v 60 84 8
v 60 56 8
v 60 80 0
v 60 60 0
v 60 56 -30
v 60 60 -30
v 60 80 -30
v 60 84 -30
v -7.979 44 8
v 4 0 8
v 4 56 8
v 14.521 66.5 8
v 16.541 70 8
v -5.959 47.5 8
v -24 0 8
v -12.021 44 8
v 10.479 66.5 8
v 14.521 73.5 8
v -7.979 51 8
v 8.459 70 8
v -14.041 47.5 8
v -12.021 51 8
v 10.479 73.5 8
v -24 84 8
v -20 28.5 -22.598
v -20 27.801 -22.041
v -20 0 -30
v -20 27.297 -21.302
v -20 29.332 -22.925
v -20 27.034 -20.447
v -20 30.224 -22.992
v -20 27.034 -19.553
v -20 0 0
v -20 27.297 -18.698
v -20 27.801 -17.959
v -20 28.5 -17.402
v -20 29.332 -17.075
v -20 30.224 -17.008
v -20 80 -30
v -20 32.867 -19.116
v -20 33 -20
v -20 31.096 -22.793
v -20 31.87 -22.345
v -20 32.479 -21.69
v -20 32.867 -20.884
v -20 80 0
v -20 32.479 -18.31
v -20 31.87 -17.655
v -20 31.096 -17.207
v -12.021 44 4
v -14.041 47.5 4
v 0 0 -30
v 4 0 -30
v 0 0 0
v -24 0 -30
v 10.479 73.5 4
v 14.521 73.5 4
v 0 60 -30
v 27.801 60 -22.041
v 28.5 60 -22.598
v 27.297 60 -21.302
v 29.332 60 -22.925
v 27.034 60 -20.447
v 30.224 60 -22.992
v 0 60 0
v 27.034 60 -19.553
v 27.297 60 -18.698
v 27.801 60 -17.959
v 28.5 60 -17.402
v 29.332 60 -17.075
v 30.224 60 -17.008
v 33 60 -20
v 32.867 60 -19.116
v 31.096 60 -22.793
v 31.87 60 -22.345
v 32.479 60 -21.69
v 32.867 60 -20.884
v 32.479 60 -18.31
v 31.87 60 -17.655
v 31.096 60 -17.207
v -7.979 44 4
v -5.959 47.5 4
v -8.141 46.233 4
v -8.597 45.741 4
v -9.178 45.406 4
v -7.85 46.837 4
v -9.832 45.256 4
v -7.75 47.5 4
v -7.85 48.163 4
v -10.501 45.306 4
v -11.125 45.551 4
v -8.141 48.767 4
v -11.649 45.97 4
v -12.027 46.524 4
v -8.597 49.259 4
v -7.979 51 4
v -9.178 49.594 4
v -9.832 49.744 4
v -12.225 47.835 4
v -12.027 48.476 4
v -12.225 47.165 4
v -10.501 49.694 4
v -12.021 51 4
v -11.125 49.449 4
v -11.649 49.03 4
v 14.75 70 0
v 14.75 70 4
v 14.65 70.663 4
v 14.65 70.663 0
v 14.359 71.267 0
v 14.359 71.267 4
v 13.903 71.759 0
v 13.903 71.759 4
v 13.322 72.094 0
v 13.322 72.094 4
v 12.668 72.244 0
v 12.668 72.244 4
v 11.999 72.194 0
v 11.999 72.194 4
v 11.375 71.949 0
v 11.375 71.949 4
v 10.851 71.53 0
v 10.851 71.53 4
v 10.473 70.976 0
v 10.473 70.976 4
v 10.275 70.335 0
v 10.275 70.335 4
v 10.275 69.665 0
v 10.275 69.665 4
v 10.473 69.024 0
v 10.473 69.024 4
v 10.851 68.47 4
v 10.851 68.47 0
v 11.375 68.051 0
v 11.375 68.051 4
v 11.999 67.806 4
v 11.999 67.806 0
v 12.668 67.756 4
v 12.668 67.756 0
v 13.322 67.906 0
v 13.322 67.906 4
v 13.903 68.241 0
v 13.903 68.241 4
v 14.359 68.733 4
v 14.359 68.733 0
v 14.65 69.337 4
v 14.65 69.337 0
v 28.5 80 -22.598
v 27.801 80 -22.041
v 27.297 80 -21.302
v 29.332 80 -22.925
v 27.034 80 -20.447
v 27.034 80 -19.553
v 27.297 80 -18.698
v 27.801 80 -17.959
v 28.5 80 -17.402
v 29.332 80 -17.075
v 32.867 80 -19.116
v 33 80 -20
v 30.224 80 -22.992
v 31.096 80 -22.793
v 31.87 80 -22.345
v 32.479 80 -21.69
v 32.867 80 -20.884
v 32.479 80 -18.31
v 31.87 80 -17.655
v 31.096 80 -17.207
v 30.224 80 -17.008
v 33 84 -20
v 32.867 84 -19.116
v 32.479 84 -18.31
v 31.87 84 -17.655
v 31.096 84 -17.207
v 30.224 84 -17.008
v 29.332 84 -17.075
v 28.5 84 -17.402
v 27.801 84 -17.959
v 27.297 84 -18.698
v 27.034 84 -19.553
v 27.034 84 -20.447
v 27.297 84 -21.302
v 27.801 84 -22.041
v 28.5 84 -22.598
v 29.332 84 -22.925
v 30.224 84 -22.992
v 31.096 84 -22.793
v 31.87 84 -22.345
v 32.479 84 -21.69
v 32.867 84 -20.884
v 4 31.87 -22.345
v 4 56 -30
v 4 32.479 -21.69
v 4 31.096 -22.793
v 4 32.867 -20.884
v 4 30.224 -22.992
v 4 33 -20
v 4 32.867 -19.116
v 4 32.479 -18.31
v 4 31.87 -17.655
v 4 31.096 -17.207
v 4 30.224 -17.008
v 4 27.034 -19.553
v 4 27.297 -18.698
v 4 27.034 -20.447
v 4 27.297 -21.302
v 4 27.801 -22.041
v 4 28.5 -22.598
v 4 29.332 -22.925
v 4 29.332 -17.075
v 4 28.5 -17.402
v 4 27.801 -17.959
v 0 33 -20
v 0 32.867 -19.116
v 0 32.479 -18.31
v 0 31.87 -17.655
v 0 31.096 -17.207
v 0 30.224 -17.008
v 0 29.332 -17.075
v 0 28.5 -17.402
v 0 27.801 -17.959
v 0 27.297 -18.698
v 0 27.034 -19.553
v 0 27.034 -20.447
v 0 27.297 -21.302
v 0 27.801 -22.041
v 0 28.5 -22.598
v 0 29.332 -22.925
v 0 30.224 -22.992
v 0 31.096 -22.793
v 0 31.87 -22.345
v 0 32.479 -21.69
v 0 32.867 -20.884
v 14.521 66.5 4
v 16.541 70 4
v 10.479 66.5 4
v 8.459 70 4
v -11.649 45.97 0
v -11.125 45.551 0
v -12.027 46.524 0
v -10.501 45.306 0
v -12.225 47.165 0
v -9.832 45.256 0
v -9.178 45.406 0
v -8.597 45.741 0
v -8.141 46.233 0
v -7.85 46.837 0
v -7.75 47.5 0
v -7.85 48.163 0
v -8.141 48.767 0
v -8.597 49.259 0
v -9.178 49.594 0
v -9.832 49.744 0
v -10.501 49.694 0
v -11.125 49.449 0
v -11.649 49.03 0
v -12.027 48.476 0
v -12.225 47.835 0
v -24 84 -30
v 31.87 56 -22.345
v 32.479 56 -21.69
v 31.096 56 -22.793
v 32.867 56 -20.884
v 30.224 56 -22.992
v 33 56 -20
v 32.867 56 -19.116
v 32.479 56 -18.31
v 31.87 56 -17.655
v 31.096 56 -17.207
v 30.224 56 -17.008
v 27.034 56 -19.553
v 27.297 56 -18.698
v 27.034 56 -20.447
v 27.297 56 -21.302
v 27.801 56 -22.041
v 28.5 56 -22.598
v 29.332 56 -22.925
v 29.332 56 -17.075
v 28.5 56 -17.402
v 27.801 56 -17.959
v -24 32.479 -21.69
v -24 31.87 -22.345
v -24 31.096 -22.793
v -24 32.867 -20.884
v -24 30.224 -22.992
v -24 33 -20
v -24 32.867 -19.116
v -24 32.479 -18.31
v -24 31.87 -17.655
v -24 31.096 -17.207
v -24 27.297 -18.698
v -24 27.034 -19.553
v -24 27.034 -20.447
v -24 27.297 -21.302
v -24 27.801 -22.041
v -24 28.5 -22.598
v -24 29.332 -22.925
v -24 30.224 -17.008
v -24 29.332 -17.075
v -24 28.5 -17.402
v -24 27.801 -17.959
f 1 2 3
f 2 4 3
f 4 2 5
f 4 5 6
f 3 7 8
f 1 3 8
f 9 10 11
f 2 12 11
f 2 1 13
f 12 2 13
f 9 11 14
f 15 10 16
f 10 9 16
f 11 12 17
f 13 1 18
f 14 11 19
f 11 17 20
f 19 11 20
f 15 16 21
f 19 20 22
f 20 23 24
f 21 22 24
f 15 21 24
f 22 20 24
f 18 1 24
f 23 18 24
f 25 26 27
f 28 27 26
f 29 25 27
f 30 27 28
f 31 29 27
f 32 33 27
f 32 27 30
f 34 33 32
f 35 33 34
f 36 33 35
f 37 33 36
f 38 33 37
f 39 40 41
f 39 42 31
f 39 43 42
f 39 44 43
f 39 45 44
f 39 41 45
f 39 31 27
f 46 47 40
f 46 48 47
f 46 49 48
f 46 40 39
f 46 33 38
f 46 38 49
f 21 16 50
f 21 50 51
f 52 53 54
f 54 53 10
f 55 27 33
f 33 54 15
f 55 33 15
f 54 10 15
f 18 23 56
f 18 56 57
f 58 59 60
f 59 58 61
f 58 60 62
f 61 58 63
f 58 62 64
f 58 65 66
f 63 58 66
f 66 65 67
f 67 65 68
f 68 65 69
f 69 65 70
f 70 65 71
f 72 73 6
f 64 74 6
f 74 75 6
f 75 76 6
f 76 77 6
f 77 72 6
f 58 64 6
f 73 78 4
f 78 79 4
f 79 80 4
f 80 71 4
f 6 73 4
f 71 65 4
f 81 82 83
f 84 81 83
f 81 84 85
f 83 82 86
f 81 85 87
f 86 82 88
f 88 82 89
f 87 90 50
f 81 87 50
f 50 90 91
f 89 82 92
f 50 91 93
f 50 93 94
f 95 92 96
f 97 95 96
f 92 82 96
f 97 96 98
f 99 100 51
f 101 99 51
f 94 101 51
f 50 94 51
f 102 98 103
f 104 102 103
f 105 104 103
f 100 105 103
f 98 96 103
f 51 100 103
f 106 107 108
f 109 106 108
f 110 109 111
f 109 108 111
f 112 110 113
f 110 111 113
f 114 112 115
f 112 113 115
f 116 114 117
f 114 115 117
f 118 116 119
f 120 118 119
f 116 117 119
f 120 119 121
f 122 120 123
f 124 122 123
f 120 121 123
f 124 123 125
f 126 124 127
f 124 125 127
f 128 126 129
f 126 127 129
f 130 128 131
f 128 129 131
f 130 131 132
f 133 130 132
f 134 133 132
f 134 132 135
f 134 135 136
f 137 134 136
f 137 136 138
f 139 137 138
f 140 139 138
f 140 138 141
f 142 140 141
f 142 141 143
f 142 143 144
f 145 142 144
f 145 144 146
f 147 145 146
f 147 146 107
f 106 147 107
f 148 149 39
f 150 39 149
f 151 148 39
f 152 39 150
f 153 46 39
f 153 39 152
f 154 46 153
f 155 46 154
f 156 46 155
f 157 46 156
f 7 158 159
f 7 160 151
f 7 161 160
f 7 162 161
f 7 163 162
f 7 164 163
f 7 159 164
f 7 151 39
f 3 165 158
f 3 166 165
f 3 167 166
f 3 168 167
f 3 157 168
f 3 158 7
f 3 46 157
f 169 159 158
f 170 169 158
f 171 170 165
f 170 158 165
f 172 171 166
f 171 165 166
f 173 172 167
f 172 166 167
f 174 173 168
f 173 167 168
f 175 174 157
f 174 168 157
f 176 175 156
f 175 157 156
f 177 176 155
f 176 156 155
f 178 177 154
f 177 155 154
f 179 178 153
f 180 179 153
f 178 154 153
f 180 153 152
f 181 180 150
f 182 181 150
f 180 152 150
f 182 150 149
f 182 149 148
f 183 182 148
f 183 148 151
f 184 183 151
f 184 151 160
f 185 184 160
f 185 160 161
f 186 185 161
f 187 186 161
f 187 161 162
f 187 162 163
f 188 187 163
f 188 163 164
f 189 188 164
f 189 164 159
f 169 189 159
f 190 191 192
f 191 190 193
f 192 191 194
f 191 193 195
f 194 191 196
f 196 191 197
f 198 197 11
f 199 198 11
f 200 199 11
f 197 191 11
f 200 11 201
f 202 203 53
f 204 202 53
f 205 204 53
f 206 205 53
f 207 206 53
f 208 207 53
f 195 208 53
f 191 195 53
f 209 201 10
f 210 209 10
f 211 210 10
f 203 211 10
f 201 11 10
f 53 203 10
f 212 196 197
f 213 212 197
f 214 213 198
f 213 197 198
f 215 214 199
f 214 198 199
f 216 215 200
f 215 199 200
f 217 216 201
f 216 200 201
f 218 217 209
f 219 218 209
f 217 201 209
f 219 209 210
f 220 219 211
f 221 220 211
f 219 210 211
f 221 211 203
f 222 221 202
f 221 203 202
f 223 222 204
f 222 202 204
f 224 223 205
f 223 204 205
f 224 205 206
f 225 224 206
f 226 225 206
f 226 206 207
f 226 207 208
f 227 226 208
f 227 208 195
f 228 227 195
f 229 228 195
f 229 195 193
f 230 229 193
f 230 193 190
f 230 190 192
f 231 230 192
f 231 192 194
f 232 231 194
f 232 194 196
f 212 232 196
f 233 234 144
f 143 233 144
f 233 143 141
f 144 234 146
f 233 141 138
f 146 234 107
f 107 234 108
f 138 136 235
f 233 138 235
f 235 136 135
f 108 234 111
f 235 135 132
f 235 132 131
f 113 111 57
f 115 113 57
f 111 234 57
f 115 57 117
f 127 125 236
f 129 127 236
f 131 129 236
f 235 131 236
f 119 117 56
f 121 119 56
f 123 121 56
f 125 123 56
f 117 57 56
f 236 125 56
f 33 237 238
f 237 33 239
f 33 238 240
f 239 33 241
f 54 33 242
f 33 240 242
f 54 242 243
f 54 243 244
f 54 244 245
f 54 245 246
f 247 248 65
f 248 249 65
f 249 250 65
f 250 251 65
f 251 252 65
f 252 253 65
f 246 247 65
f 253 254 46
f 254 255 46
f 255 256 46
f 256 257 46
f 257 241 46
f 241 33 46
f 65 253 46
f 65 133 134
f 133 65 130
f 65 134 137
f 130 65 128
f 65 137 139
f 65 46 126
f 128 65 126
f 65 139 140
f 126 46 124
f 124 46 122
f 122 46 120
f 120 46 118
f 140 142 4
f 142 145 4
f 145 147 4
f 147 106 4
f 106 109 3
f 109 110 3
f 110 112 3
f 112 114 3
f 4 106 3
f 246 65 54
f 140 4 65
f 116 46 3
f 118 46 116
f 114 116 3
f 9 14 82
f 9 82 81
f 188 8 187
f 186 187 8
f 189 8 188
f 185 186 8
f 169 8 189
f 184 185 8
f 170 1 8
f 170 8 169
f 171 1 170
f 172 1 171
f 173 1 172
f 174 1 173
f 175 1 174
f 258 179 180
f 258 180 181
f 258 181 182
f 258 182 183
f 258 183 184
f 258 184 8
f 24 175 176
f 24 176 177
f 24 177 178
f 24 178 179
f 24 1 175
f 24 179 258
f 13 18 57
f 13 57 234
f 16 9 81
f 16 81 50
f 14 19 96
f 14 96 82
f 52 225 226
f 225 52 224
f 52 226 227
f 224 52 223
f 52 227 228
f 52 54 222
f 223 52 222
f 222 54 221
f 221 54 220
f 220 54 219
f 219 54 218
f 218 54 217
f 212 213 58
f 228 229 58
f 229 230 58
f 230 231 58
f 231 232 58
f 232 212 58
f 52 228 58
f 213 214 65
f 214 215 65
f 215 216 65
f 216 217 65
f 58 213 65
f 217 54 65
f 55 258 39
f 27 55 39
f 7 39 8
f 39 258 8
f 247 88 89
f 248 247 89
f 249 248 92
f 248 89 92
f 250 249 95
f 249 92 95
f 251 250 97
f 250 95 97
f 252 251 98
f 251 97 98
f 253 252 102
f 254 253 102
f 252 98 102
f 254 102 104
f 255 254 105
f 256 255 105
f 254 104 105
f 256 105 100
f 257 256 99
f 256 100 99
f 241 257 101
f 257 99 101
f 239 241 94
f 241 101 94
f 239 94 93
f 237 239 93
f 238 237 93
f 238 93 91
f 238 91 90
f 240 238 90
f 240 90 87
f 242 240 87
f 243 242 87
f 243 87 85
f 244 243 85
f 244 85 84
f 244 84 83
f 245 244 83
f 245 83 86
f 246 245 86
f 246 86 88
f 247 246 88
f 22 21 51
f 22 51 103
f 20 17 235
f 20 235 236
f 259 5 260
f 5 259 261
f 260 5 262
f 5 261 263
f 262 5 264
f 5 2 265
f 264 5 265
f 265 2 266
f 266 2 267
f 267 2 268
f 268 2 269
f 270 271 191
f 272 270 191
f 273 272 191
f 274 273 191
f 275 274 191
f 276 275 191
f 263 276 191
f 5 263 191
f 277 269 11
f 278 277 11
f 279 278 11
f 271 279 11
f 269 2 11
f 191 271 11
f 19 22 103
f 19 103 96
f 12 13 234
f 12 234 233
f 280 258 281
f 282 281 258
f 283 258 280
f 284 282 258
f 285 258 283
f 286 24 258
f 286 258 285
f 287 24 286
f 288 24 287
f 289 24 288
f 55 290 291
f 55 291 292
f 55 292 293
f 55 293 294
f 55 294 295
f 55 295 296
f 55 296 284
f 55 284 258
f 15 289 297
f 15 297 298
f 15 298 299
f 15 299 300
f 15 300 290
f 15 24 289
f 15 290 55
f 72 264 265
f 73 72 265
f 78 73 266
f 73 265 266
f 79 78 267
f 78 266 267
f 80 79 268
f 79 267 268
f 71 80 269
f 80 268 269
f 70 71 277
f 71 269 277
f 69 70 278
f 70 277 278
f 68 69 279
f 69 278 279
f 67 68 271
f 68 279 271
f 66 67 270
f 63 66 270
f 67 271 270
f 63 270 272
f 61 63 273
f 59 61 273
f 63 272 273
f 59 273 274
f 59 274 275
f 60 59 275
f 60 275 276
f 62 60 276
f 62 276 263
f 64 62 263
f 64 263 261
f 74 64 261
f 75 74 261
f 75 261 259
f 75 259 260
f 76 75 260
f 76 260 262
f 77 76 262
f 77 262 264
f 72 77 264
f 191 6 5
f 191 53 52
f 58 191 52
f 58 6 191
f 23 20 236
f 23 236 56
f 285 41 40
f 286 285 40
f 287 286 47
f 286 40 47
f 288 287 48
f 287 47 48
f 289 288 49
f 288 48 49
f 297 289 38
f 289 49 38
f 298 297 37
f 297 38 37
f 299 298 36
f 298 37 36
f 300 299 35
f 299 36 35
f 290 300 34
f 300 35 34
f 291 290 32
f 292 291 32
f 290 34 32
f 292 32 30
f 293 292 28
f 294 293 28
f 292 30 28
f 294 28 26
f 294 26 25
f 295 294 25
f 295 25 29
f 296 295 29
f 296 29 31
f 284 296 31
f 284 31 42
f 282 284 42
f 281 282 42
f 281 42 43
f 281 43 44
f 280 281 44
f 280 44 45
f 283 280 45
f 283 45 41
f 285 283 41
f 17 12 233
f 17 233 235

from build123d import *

# Parameters (mm, degrees)
BOSS_EXTRU_1_DEPTH      = 8
ENL_V_MAT_EXTRU_1_DEPTH = 4
ESQUISSE3_R             = 2.25
ENL_V_MAT_EXTRU_2_DEPTH = 5
BOSS_EXTRU_2_DEPTH      = 38
ESQUISSE5_R             = 3
ENL_V_MAT_EXTRU_3_DEPTH = 29
ESQUISSE6_R             = 3
ENL_V_MAT_EXTRU_4_DEPTH = 29


with BuildPart() as part:
    # Esquisse1 → Boss.-Extru.1 (new body)
    with BuildSketch(Plane.XY):
        Polygon((0, 0), (0, 60), (60, 60), (60, 80), (-20, 80), (-20, 0), align=None)
    extrude(amount=BOSS_EXTRU_1_DEPTH)

    # Esquisse2 → Enlèv. mat.-Extru.1 (cut)
    with BuildSketch(Plane.XY.offset(8)):
        Polygon((-14.041451884, 47.5), (-12.020725942, 51), (-7.979274058, 51), (-5.958548116, 47.5), (-7.979274058, 44), (-12.020725942, 44), align=None)
        Polygon((8.458548116, 70), (10.479274058, 73.5), (14.520725942, 73.5), (16.541451884, 70), (14.520725942, 66.5), (10.479274058, 66.5), align=None)
    extrude(amount=-ENL_V_MAT_EXTRU_1_DEPTH, mode=Mode.SUBTRACT)

    # Esquisse3 → Enlèv. mat.-Extru.2 (cut, through all)
    with BuildSketch(Plane.XY.offset(4)):
        with Locations((-10, 47.5)):
            Circle(ESQUISSE3_R)
        with Locations((12.5, 70)):
            Circle(ESQUISSE3_R)
    extrude(amount=-ENL_V_MAT_EXTRU_2_DEPTH, mode=Mode.SUBTRACT)

    # Esquisse4 → Boss.-Extru.2 (add)
    with BuildSketch(Plane.XY.offset(8)):
        Polygon((0, 0), (0, 60), (60, 60), (60, 56), (4, 56), (4, 0), align=None)
        Polygon((60, 80), (60, 84), (-24, 84), (-24, 0), (-20, 0), (-20, 80), align=None)
    extrude(amount=-BOSS_EXTRU_2_DEPTH)

    # Esquisse5 → Enlèv. mat.-Extru.3 (cut, through all)
    with BuildSketch(Plane.XZ.offset(-56)):
        with Locations((30, -20)):
            Circle(ESQUISSE5_R)
    extrude(amount=-ENL_V_MAT_EXTRU_3_DEPTH, mode=Mode.SUBTRACT)

    # Esquisse6 → Enlèv. mat.-Extru.4 (cut, through all)
    with BuildSketch(Plane(origin=(4, 0, 0), x_dir=(0, 0, -1), z_dir=(1, 0, 0))):
        with Locations(Location((20, 30, 0), (0, 0, 90))):  # turned: the seam where the file's is
            Circle(ESQUISSE6_R)
    extrude(amount=-ENL_V_MAT_EXTRU_4_DEPTH, mode=Mode.SUBTRACT)


solid = part.part
